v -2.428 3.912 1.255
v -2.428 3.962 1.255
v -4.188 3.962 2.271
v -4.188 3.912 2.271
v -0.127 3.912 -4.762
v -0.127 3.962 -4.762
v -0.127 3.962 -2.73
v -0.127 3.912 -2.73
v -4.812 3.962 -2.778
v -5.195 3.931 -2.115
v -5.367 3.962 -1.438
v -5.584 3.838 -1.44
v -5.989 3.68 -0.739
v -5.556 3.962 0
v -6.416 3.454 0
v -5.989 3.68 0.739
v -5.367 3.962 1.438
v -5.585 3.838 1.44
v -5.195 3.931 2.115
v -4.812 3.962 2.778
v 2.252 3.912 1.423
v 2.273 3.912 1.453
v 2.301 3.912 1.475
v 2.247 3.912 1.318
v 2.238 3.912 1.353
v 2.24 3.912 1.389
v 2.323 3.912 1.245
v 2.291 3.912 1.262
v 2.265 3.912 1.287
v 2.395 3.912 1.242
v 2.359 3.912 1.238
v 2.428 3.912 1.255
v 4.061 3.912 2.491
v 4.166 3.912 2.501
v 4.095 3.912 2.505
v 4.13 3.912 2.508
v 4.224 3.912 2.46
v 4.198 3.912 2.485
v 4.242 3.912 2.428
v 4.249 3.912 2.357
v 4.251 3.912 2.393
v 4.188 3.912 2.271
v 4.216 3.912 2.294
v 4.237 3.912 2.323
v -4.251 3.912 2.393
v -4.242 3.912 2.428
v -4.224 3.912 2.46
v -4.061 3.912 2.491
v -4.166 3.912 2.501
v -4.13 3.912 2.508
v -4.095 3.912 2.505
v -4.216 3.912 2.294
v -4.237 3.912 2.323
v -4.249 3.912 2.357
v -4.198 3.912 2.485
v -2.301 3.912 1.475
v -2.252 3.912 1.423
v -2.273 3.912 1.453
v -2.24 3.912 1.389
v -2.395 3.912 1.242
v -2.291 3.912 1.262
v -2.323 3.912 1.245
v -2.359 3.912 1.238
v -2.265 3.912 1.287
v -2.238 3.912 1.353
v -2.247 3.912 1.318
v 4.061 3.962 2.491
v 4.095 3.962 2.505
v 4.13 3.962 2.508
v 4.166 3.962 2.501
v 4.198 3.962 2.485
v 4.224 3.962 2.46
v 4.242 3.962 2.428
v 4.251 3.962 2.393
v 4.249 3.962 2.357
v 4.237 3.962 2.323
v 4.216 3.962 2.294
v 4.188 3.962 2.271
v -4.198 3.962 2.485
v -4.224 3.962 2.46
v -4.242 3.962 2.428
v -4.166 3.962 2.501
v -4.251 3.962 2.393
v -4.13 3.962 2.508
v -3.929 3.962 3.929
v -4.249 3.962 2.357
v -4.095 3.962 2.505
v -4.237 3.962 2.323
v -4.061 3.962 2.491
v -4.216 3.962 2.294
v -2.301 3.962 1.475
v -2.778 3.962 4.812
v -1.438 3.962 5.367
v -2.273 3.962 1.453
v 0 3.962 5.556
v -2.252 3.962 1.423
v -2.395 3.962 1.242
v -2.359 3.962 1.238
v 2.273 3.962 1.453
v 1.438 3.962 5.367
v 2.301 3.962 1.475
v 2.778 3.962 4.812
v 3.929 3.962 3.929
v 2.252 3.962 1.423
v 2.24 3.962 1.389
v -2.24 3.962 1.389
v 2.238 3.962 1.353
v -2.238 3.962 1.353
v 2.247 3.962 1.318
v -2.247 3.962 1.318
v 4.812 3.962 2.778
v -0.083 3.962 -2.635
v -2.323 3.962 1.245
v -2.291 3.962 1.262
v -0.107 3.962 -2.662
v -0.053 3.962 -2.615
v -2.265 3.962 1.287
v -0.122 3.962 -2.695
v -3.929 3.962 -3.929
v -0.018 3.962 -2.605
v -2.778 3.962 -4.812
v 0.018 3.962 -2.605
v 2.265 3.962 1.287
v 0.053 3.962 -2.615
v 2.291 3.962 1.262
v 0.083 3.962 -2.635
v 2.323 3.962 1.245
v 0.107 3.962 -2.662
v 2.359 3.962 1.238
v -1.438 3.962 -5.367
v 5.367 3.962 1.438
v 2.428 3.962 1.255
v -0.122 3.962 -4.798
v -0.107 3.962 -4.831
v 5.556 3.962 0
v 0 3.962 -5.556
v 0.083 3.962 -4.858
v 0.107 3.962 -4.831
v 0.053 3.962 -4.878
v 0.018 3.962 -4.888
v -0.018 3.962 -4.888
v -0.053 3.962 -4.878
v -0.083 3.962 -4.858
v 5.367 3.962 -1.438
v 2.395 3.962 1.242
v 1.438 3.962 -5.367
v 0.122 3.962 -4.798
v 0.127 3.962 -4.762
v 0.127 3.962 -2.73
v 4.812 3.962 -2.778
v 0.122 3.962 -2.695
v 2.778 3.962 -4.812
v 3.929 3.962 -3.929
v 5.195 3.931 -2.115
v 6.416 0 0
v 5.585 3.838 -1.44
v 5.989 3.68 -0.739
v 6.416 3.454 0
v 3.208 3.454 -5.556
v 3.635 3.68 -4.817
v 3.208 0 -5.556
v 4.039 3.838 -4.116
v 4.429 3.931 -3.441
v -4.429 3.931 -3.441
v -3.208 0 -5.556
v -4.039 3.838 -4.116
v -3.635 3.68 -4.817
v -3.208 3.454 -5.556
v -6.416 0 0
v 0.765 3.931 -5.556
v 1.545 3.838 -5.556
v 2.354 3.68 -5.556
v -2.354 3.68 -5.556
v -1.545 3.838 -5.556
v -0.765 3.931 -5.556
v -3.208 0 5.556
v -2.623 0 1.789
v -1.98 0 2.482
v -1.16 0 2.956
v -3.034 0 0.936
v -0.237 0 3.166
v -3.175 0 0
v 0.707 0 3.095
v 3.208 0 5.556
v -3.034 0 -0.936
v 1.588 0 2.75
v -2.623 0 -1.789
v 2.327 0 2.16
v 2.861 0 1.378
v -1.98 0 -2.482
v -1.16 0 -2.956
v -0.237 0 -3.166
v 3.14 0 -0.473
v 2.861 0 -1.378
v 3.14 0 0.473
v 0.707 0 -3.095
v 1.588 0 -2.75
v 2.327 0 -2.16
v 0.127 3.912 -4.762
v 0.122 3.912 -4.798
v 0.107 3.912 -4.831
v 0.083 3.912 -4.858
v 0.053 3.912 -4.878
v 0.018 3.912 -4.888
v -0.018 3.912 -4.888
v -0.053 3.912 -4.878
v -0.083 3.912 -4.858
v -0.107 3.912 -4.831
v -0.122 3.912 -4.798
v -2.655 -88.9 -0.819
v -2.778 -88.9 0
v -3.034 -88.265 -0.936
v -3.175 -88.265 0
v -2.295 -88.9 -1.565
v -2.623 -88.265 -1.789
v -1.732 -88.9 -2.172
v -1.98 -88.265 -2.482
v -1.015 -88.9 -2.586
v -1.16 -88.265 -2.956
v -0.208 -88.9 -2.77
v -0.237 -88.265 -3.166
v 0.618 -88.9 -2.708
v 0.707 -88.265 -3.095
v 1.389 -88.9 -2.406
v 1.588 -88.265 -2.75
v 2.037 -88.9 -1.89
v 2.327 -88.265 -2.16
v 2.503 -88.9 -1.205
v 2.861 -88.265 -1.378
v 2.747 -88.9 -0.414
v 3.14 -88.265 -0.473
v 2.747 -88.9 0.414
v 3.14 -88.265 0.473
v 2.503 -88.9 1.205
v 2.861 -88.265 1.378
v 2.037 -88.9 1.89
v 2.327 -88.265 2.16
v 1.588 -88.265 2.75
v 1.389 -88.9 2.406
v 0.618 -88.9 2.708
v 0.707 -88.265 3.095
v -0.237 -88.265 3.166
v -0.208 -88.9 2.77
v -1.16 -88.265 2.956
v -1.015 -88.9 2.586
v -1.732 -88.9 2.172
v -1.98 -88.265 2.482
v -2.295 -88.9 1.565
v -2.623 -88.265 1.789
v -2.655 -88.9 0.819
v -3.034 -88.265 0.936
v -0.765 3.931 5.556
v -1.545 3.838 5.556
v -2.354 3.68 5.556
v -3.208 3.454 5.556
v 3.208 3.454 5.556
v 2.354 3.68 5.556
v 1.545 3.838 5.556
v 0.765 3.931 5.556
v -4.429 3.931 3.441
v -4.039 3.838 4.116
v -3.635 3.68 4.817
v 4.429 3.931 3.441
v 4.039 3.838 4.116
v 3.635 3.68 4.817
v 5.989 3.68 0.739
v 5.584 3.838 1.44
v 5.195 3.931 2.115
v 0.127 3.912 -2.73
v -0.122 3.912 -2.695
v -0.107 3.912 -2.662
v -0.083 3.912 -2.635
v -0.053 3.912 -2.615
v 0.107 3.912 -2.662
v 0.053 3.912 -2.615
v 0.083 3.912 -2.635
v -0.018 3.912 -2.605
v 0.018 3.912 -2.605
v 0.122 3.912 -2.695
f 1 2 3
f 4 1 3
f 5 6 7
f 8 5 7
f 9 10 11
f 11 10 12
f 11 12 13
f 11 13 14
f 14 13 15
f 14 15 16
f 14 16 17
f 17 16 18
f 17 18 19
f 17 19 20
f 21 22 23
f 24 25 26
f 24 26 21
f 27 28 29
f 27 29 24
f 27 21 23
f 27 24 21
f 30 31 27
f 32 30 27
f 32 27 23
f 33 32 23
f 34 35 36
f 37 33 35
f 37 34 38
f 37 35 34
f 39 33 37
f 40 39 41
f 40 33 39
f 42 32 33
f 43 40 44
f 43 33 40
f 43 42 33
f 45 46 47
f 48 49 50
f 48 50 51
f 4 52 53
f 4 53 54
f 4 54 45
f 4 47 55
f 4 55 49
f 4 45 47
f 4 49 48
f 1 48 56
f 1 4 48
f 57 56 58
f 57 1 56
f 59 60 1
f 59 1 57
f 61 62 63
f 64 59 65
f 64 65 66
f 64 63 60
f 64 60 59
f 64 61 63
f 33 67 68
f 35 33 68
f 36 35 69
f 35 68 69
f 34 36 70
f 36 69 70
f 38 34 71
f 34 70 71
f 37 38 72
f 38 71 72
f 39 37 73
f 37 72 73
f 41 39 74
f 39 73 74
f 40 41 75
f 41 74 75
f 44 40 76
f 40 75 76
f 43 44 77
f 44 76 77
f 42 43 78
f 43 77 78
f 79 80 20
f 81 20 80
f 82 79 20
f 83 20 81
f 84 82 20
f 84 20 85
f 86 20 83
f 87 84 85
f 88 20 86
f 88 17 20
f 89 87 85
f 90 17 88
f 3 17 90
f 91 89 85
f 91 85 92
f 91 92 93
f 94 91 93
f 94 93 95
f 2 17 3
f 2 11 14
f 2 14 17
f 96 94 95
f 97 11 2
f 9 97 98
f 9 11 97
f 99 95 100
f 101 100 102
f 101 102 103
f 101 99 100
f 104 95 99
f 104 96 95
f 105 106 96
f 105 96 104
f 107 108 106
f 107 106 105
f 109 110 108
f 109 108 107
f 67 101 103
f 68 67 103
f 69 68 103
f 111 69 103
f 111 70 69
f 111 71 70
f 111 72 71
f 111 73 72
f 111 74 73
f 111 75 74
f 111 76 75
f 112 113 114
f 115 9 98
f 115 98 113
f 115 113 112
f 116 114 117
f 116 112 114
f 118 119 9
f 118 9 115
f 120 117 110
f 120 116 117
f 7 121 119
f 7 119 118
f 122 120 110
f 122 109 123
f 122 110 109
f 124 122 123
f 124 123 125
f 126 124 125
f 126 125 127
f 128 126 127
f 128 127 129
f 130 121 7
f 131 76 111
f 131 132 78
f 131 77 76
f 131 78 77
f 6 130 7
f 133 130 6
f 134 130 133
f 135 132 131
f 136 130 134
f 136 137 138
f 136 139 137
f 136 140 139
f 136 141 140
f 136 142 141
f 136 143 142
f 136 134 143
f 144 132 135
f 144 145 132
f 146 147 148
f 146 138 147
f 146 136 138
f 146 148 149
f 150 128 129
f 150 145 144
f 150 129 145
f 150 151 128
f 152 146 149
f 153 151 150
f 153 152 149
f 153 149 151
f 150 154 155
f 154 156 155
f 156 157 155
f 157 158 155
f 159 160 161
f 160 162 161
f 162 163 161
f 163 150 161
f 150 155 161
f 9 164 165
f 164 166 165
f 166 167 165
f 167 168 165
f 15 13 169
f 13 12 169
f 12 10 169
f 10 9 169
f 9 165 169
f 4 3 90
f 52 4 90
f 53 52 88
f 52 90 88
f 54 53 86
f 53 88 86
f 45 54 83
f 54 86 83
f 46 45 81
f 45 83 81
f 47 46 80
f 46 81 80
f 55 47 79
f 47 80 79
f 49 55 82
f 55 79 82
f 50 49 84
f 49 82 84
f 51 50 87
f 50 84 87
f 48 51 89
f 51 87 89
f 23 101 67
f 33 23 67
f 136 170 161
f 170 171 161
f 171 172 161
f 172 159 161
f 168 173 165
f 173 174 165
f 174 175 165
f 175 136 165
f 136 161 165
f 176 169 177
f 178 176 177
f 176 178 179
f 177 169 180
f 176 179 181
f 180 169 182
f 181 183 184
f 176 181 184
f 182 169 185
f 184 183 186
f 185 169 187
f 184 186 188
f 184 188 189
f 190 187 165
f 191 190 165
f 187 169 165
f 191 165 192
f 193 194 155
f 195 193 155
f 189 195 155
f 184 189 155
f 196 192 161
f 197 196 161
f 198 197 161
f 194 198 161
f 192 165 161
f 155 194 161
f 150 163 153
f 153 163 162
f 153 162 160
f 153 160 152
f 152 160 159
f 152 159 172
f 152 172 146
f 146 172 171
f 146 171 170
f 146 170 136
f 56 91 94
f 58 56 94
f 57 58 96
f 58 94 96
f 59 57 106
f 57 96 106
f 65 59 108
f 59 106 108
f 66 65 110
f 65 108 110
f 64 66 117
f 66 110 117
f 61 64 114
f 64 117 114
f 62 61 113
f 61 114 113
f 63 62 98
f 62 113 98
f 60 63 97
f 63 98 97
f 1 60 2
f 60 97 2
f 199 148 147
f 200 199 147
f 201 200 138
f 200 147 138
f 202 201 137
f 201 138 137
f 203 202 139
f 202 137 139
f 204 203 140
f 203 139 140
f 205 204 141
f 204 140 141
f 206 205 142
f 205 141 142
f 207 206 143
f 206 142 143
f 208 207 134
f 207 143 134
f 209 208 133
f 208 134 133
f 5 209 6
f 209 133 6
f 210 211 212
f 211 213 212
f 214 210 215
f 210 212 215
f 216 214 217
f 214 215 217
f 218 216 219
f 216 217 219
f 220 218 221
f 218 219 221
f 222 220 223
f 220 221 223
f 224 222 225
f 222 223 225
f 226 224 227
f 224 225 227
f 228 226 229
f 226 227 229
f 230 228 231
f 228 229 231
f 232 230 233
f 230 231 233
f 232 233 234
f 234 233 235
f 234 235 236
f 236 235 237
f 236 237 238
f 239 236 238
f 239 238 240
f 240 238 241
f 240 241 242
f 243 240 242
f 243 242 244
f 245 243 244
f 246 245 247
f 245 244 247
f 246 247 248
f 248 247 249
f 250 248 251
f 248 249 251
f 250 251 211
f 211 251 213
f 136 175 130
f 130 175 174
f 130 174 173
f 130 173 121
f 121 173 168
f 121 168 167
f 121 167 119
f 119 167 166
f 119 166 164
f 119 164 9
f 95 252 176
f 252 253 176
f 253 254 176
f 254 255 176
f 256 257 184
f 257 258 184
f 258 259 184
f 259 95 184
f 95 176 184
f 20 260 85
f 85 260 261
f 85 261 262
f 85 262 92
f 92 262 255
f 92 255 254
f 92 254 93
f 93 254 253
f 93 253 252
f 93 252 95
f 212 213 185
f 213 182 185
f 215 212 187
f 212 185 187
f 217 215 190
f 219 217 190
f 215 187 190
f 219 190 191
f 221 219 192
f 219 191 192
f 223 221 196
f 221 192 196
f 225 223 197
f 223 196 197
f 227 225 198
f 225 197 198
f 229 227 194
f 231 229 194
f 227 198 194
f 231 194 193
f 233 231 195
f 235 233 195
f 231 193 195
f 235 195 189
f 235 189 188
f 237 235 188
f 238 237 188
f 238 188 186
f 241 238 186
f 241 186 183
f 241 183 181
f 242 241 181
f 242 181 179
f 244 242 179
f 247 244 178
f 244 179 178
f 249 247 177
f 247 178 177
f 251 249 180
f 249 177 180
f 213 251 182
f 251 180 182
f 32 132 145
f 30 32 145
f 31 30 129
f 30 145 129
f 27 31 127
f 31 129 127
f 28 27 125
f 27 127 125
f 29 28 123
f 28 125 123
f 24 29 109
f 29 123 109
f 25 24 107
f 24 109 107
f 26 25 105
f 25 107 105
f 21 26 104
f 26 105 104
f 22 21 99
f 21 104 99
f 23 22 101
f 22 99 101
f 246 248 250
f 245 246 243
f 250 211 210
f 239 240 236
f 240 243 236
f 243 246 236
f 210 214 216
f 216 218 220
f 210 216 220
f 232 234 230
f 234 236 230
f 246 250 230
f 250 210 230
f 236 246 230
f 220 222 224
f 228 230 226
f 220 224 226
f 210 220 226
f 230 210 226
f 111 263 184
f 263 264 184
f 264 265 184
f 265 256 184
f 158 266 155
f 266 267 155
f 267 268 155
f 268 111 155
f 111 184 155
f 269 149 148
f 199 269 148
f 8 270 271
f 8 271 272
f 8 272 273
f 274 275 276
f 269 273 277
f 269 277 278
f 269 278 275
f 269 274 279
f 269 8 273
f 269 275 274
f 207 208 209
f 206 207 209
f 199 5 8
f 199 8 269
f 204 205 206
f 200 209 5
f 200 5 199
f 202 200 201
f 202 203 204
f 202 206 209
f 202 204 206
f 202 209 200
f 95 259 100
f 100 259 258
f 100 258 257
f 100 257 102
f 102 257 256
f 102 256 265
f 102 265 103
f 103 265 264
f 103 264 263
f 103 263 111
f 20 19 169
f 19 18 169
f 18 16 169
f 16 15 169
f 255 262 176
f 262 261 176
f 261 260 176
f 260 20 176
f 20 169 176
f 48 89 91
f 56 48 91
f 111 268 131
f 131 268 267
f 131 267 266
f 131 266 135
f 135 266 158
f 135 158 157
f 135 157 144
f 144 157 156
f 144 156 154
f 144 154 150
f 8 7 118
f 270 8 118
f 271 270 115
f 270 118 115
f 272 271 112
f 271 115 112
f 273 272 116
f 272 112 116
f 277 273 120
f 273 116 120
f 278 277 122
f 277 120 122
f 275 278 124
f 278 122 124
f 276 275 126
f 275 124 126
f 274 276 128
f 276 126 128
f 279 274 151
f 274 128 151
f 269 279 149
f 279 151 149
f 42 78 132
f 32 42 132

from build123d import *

# Parameters (mm, degrees)
BOSS_EXTRUDE1_DEPTH = 3.9624
CUT_EXTRUDE1_DEPTH  = 0.0508


with BuildPart() as part:
    # Sketch1 → Boss-Extrude1 (new body)
    with BuildSketch(Plane(origin=(0, 0, 0), x_dir=(1, 0, 0), z_dir=(0, 1, 0))):
        Polygon((6.415804866, 0), (3.207902433, 5.55625), (-3.207902433, 5.55625), (-6.415804866, 0), (-3.207902433, -5.55625), (3.207902433, -5.55625), align=None)
    extrude(amount=BOSS_EXTRUDE1_DEPTH)

    # Sketch2 → Cut-Revolve1 (revolve, cut)
    with BuildSketch(Plane.XY):
        Polygon((5.55625, 3.9624), (6.415804866, 3.4544), (6.415804866, 3.9624), align=None)
    revolve(axis=Axis((0, 0, 0), (0, 1, 0)), mode=Mode.SUBTRACT)

    # Sketch3 → Cut-Extrude1 (cut)
    with BuildSketch(Plane(origin=(0, 3.9624, 0), x_dir=(-1, 0, 0), z_dir=(0, -1, 0))):
        with BuildLine():
            Line((0.127, 4.7625), (0.127, 2.7305))
            ThreePointArc((0.127, 2.7305), (0, 2.6035), (-0.127, 2.7305))
            Line((-0.127, 2.7305), (-0.127, 4.7625))
            ThreePointArc((-0.127, 4.7625), (0, 4.8895), (0.127, 4.7625))
        make_face()
        with BuildLine():
            Line((4.060945986, -2.491235226), (2.301182365, -1.475235226))
            ThreePointArc((2.301182365, -1.475235226), (2.254697139, -1.30175), (2.428182365, -1.255264774))
            Line((2.428182365, -1.255264774), (4.187945986, -2.271264774))
            ThreePointArc((4.187945986, -2.271264774), (4.234431212, -2.44475), (4.060945986, -2.491235226))
        make_face()
        with BuildLine():
            Line((-4.187945986, -2.271264774), (-2.428182365, -1.255264774))
            ThreePointArc((-2.428182365, -1.255264774), (-2.254697139, -1.30175), (-2.301182365, -1.475235226))
            Line((-2.301182365, -1.475235226), (-4.060945986, -2.491235226))
            ThreePointArc((-4.060945986, -2.491235226), (-4.234431212, -2.44475), (-4.187945986, -2.271264774))
        make_face()
    extrude(amount=CUT_EXTRUDE1_DEPTH, mode=Mode.SUBTRACT)

    # Bolt Length Sketch → Bolt Length (revolve)
    with BuildSketch(Plane.XY, mode=Mode.PRIVATE) as bolt_length_sk:
        Polygon((0, 0), (0, -88.9), (2.778125, -88.9), (3.175, -88.265), (3.175, 0), align=None)
    revolve(bolt_length_sk.sketch.rotate(Axis((0, 0, 0), (0, -1, 0)), 180), axis=Axis((0, 0, 0), (0, -1, 0)))


solid = part.part
